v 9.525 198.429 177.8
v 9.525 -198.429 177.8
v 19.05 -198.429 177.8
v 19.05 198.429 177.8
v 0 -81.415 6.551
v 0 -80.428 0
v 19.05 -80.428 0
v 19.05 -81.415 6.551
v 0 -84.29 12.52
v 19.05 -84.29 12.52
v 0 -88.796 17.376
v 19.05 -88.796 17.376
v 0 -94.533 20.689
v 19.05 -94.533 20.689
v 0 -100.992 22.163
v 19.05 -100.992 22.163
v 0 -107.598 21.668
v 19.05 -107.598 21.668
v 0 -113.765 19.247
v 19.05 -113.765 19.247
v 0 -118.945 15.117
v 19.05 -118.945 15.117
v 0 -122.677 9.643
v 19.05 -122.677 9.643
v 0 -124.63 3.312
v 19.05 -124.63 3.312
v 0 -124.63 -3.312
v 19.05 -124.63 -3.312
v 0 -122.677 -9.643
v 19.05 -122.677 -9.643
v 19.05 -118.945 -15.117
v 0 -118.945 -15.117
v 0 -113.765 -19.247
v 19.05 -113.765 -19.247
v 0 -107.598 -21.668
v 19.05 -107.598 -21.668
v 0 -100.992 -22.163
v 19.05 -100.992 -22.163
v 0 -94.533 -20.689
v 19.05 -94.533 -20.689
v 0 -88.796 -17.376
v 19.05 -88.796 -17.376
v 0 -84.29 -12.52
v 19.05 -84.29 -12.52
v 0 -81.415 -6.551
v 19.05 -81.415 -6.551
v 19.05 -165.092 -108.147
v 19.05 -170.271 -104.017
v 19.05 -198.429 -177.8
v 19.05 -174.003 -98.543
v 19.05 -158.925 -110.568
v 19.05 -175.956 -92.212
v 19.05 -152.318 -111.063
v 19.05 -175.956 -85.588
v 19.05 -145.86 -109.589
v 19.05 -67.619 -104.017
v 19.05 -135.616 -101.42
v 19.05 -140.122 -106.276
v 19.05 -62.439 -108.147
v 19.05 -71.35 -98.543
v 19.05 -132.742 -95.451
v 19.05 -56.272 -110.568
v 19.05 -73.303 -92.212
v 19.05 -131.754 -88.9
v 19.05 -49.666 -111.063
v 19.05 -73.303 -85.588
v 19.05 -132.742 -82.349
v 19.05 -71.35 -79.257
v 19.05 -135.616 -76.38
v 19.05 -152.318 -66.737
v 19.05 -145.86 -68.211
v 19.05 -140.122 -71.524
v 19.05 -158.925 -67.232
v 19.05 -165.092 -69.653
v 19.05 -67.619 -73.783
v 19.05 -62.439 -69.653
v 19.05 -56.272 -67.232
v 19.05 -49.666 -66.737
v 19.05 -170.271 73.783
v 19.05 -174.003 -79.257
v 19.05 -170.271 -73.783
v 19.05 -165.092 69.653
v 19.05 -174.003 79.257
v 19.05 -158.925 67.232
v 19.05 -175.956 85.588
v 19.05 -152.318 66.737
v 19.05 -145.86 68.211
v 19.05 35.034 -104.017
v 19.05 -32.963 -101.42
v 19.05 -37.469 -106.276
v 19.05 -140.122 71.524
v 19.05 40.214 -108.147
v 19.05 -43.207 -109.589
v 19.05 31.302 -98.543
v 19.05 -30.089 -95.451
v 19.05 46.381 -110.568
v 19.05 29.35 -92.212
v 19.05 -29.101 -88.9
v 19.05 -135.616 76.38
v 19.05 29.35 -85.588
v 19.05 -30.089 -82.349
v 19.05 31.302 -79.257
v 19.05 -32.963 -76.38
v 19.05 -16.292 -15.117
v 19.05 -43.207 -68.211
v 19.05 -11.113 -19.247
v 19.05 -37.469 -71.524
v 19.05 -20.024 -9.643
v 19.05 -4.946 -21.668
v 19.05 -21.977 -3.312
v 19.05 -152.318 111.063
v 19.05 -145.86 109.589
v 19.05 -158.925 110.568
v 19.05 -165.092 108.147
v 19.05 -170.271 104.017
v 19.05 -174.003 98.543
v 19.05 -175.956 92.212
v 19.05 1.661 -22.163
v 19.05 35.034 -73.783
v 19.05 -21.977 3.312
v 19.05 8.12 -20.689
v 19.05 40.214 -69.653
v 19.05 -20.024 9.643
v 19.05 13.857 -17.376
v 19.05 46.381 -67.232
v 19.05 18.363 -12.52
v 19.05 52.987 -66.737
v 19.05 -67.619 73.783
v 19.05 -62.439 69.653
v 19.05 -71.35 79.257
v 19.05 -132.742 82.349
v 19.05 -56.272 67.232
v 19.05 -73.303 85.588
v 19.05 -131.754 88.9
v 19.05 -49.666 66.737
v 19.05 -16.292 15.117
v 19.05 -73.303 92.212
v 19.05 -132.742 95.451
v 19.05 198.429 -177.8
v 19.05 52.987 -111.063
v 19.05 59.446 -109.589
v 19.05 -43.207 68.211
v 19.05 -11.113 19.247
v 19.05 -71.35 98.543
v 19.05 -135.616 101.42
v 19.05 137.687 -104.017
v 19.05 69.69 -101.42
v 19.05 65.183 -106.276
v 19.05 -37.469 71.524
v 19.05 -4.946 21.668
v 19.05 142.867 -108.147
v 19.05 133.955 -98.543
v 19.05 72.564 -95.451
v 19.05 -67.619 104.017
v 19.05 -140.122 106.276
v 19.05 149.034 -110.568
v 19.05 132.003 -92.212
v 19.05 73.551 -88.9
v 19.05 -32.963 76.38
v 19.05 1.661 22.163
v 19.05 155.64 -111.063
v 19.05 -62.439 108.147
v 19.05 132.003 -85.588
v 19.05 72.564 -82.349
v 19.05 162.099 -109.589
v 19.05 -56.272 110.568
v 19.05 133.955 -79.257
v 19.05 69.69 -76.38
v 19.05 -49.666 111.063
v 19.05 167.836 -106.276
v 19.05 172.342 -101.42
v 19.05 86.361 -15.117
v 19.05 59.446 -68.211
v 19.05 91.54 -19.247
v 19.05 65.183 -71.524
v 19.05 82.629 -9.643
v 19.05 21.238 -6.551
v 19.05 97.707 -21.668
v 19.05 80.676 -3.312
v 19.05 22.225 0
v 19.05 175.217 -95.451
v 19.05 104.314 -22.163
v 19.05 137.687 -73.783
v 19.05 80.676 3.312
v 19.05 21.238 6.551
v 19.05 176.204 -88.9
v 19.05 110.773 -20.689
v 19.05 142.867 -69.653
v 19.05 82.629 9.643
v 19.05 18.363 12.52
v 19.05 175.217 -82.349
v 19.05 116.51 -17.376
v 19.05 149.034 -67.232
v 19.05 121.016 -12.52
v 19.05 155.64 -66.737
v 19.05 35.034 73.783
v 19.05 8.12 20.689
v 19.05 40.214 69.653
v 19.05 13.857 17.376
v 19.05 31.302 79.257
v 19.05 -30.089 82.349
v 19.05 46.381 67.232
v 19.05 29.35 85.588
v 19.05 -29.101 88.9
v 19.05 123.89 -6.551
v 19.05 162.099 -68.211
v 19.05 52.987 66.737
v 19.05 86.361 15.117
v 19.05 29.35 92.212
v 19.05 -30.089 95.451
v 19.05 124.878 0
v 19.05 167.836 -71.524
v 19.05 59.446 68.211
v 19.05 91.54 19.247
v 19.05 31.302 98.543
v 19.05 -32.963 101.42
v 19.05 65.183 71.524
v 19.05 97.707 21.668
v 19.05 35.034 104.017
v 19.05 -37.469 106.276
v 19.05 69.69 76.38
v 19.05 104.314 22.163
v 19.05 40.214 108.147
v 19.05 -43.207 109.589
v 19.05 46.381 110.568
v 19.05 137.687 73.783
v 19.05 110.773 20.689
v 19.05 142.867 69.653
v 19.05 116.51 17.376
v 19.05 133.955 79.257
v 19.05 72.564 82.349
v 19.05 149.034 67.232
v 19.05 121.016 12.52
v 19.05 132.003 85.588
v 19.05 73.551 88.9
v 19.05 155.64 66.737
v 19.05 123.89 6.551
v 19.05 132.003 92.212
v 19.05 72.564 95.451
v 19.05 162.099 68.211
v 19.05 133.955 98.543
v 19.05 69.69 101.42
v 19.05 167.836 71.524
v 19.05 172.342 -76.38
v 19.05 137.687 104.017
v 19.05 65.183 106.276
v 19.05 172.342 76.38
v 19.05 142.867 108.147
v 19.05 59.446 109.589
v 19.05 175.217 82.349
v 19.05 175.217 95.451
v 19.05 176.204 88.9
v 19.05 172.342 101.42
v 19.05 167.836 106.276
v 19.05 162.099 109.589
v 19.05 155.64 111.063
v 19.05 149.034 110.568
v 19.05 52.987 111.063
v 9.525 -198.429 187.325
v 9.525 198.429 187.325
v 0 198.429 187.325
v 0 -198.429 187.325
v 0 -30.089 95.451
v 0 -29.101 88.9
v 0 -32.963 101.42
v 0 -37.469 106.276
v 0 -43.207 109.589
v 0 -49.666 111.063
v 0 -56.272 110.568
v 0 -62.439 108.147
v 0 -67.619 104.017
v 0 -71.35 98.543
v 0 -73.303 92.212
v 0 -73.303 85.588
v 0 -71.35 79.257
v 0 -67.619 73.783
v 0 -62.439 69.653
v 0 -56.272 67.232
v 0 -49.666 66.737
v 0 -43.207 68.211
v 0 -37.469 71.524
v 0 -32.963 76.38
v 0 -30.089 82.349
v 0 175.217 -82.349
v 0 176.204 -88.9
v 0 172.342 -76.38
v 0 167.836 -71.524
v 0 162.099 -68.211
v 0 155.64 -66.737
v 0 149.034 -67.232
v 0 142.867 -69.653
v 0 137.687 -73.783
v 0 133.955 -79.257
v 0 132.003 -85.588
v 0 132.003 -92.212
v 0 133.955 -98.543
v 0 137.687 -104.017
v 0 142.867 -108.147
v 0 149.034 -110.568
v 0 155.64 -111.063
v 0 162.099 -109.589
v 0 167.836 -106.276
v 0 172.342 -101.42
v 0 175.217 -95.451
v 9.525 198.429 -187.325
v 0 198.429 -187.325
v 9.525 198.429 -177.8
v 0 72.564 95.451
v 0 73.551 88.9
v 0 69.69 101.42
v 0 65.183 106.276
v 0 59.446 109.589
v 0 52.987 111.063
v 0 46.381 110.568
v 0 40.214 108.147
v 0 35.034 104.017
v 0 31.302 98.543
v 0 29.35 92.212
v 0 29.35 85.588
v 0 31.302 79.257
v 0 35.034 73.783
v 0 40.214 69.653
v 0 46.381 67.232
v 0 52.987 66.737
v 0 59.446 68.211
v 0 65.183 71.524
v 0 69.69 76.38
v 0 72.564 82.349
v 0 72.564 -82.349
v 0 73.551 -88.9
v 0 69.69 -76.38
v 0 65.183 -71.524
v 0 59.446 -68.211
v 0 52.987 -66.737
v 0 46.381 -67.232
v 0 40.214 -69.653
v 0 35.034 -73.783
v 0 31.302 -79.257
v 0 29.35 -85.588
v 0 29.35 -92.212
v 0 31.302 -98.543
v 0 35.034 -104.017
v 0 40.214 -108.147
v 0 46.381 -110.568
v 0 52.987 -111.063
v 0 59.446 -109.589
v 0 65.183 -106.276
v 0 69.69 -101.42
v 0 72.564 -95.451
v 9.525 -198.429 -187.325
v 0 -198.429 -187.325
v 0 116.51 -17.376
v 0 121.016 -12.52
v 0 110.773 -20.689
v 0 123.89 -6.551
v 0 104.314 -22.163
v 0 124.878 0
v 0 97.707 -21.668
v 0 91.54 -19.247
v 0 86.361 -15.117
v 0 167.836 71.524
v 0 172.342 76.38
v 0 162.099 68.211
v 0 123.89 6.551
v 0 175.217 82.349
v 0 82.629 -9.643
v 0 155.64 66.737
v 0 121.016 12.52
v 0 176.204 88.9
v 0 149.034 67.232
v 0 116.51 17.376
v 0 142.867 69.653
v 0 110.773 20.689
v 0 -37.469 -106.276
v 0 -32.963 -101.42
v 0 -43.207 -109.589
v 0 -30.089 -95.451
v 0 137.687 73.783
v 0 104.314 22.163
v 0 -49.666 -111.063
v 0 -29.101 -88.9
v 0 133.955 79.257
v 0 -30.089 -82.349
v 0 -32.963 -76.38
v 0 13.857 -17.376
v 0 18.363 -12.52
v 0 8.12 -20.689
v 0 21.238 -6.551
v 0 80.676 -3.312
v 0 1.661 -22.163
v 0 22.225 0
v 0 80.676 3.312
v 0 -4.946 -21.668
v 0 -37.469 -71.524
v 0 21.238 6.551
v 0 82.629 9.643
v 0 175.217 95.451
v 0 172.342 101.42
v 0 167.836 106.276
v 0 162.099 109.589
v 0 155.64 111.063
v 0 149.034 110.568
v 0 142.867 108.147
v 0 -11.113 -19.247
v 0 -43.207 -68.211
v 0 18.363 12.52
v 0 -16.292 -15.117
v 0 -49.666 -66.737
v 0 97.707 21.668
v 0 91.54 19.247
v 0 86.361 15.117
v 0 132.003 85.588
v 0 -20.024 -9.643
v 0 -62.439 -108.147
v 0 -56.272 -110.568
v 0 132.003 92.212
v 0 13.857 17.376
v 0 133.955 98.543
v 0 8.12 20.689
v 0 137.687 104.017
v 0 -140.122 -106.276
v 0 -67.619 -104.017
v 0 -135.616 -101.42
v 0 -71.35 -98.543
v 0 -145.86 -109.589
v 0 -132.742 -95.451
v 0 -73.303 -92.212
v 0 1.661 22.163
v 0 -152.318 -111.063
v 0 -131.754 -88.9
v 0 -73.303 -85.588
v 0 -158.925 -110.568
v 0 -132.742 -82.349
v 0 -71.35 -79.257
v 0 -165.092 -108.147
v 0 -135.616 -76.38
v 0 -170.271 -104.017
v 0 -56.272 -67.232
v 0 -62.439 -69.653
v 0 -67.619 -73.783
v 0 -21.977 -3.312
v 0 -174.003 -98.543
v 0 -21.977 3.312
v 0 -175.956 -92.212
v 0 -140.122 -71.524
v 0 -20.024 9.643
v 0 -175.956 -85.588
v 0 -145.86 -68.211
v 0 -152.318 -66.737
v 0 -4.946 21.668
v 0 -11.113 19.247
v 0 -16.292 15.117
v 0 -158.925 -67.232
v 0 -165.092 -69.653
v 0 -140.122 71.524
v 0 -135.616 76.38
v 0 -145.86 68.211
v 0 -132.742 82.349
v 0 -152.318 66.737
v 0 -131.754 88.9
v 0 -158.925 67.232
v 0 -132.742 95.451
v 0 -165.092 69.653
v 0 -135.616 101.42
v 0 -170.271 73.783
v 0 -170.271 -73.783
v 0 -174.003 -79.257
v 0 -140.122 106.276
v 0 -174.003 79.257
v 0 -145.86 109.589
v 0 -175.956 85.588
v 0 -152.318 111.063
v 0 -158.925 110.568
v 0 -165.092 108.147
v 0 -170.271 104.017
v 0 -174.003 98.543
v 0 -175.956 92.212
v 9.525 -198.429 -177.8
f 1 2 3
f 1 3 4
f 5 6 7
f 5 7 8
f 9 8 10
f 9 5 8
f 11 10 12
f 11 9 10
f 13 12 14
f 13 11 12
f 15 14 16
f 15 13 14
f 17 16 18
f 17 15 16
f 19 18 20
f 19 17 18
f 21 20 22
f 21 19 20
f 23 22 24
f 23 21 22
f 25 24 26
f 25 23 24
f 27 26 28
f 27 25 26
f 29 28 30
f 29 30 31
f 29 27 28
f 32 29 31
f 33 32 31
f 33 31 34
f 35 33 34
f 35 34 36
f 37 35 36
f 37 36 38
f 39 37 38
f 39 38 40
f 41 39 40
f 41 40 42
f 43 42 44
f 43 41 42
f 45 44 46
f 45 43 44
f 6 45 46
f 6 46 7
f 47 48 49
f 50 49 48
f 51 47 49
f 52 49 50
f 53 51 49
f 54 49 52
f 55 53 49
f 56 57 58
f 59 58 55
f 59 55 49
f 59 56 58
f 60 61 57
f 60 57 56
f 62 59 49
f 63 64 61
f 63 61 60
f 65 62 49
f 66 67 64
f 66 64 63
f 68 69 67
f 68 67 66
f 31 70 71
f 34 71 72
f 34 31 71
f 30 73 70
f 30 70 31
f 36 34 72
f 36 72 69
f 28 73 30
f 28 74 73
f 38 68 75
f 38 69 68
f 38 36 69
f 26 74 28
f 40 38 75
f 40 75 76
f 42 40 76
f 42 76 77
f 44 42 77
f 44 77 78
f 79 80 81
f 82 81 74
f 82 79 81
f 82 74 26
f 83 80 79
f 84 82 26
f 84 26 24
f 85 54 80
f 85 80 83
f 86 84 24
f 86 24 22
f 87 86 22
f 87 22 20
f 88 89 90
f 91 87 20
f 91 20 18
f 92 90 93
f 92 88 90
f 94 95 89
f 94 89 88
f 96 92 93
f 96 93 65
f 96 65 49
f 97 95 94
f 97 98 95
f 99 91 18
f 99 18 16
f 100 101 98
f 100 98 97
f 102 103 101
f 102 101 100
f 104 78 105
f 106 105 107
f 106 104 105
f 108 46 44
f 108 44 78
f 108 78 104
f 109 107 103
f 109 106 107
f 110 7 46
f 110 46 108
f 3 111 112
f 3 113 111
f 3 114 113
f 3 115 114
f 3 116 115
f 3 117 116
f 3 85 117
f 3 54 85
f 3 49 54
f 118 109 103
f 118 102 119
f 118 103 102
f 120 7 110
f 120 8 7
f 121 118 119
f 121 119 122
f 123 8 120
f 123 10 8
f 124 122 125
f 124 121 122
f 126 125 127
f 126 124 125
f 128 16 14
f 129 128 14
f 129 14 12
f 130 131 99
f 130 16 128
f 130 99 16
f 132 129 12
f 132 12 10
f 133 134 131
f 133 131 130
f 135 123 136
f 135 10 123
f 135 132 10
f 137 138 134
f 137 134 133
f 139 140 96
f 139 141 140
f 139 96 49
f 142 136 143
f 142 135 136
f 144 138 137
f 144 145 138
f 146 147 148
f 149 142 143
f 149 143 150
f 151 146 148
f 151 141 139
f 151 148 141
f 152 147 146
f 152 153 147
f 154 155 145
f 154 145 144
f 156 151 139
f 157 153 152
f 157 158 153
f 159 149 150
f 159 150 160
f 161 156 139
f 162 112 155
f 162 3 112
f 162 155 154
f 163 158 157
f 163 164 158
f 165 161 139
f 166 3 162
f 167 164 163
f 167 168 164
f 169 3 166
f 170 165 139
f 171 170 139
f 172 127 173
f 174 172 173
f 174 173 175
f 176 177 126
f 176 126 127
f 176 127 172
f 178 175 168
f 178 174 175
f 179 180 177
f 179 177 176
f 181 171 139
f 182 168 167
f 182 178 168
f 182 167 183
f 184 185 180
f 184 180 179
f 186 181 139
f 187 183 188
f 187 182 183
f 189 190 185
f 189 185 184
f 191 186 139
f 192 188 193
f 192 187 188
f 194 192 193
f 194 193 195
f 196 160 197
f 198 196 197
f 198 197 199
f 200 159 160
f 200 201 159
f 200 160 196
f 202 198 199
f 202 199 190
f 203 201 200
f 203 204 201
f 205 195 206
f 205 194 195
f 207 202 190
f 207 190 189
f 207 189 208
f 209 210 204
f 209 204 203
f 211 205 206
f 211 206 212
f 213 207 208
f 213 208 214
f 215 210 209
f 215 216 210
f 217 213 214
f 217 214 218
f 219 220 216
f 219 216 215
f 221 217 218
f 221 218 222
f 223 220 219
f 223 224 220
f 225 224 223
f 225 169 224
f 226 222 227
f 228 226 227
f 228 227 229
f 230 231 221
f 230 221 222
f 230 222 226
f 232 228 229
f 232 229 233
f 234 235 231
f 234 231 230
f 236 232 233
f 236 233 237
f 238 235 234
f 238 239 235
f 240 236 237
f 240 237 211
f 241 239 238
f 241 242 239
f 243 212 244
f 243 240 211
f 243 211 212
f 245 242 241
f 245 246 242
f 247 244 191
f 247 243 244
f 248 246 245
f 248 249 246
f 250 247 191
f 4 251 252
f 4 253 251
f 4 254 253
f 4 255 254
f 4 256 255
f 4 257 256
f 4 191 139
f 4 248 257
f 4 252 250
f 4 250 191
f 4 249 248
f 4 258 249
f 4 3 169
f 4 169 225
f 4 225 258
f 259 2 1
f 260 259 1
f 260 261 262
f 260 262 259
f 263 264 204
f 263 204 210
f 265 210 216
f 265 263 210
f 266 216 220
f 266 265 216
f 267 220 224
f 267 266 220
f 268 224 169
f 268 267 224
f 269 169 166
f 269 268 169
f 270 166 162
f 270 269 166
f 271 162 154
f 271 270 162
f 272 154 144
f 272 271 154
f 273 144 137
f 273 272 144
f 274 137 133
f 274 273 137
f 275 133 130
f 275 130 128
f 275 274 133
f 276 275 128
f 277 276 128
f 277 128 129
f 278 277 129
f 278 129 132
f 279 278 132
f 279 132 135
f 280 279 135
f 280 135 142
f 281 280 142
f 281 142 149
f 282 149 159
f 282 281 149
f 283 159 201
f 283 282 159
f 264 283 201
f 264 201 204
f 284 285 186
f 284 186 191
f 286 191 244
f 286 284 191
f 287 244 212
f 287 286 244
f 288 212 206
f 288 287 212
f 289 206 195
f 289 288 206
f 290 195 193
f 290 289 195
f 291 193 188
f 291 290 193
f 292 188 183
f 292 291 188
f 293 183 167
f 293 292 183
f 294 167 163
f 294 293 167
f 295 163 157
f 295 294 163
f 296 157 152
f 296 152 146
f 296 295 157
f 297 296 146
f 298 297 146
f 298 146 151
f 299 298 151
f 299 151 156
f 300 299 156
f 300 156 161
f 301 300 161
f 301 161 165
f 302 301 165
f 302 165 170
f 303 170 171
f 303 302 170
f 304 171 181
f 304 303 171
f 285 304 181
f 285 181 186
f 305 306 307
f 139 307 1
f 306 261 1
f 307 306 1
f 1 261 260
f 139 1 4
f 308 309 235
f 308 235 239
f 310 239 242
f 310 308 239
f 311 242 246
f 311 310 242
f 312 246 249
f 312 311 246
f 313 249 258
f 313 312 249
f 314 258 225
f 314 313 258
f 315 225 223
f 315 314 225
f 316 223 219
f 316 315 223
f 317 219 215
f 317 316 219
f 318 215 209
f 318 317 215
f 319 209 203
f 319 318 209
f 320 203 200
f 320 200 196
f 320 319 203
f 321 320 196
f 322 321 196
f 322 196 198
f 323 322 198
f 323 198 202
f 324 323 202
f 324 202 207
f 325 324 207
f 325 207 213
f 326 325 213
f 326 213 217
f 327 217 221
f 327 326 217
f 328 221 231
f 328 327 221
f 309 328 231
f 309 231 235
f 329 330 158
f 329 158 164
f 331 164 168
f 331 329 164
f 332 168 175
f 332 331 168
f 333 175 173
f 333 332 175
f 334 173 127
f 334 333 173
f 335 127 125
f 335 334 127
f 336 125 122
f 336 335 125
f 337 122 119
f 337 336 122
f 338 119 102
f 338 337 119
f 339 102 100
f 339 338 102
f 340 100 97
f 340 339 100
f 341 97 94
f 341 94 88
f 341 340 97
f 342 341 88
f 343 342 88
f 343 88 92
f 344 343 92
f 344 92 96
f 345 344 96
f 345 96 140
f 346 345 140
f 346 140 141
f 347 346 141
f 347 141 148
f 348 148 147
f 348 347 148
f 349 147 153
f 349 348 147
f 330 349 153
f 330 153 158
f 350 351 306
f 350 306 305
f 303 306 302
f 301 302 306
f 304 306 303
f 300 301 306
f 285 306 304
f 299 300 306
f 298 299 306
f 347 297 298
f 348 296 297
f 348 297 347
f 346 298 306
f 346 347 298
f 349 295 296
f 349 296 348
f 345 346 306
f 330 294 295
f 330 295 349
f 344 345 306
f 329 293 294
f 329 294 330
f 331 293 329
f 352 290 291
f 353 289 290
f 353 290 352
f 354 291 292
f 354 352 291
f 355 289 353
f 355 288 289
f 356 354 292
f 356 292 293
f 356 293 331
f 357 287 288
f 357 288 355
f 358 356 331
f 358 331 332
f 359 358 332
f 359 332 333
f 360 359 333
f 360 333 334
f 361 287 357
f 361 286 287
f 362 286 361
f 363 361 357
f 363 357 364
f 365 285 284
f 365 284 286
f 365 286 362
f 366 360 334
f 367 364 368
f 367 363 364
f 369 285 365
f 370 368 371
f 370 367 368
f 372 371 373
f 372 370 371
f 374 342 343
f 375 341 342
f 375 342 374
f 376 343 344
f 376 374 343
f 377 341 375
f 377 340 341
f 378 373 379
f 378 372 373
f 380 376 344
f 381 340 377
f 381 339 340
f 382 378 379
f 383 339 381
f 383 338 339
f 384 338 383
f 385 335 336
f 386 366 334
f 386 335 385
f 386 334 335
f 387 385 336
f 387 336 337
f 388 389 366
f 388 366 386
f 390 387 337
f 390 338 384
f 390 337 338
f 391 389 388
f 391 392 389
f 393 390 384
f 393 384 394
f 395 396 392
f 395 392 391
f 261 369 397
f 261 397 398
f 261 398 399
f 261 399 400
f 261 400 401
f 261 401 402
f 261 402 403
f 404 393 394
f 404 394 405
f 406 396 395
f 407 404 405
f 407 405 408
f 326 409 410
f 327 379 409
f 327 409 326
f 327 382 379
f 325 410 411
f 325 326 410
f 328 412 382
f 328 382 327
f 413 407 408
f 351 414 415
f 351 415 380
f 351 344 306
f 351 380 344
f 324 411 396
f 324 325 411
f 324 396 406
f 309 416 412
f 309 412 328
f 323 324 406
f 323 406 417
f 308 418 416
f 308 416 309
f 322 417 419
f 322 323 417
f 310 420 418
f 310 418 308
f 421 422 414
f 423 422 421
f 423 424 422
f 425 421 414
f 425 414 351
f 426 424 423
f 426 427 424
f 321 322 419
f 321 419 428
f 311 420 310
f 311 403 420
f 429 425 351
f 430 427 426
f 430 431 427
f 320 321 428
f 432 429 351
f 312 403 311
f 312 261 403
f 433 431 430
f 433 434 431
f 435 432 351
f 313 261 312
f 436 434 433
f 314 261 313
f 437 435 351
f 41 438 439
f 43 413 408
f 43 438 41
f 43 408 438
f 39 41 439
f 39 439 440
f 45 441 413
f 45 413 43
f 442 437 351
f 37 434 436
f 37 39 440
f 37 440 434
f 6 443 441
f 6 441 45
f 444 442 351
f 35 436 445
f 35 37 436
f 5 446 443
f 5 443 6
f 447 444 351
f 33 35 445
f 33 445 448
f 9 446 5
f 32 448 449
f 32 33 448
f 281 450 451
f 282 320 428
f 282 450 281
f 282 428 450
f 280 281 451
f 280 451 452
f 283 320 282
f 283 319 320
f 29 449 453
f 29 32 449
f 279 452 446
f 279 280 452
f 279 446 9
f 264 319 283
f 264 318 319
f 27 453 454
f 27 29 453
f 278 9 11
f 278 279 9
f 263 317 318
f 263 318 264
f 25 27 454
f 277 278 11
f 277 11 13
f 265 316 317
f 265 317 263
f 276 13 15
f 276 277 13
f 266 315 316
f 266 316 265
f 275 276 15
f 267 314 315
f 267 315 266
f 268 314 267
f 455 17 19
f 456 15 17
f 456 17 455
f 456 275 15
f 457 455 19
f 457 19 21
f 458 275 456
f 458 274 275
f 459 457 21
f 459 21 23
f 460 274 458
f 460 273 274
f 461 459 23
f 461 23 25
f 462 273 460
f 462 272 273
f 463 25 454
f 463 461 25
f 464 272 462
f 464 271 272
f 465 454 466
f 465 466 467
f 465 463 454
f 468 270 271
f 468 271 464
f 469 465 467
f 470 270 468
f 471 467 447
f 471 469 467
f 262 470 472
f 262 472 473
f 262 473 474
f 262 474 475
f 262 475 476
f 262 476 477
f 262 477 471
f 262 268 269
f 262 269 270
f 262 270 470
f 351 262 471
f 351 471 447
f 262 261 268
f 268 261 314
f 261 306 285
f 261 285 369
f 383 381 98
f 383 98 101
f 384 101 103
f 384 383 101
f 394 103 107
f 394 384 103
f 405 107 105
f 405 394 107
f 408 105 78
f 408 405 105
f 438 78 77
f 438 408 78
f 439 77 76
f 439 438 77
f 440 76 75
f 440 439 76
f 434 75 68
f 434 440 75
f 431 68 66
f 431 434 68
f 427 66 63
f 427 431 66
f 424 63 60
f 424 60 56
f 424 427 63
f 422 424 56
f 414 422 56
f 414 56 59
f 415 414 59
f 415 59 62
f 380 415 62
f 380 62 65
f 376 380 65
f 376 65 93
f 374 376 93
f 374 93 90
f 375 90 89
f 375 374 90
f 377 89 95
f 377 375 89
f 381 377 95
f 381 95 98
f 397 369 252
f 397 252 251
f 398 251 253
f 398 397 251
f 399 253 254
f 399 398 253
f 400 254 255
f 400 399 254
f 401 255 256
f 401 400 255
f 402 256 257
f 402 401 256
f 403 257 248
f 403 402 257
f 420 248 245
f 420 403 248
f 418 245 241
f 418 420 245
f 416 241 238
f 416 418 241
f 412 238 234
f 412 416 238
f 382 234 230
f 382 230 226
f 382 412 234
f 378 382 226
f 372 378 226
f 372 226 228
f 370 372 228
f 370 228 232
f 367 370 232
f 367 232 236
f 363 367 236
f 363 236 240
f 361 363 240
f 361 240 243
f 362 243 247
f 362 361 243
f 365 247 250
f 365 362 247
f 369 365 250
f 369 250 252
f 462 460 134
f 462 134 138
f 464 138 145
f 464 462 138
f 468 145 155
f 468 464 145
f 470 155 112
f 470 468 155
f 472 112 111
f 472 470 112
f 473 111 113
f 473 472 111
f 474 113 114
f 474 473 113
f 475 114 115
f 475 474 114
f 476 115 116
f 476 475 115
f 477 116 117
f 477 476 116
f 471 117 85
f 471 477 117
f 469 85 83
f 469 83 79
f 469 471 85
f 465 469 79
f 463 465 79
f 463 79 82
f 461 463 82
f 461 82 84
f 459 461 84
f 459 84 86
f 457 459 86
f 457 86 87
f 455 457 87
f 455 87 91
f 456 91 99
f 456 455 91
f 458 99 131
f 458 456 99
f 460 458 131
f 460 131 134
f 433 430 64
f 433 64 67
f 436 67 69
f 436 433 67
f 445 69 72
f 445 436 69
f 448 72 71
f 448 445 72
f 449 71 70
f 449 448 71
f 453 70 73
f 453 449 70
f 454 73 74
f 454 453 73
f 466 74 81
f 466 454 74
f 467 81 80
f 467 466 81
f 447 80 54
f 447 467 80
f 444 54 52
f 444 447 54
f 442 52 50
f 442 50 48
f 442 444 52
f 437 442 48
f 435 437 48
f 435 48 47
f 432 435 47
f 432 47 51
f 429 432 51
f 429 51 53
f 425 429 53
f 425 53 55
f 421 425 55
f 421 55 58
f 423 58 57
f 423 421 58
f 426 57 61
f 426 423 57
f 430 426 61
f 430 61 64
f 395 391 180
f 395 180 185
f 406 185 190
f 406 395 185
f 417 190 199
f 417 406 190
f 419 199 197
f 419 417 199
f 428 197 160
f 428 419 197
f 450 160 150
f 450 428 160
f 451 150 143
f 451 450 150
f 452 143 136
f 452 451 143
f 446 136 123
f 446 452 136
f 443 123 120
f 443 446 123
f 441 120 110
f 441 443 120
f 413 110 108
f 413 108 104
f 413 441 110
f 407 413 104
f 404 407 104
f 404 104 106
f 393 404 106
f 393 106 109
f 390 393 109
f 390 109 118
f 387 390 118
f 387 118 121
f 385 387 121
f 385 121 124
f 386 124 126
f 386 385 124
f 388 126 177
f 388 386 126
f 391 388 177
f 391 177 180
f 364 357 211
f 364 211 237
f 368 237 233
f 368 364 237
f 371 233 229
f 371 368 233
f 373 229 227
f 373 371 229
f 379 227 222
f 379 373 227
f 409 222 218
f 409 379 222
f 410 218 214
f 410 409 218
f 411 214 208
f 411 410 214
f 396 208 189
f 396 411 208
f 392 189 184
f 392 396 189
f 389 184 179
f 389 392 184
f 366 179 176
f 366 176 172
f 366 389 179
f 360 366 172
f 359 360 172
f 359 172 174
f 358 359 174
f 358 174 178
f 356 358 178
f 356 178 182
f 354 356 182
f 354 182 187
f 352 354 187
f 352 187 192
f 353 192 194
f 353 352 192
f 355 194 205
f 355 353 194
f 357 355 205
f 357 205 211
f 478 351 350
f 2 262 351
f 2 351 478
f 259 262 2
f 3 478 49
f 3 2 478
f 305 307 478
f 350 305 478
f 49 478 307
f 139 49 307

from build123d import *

# Parameters (mm, degrees)
F0_W     = 396.858634
F0_H     = 355.6
F0_R     = 22.225
F1_DEPTH = 19.05
F2_W     = 9.525
F2_H     = 396.858634
F3_DEPTH = 9.525
F4_W     = 9.525
F4_H     = 396.858634
F5_DEPTH = 9.525


with BuildPart() as f1:
    # F0 (on Right) → F1 (new body)
    with BuildSketch(Plane.YZ):
        Rectangle(F0_W, F0_H)
        with Locations((-153.979317, -88.9)):
            Circle(F0_R, mode=Mode.SUBTRACT)
        with Locations((-51.326439, -88.9)):
            Circle(F0_R, mode=Mode.SUBTRACT)
        with Locations((51.326439, -88.9)):
            Circle(F0_R, mode=Mode.SUBTRACT)
        with Locations((153.979317, -88.9)):
            Circle(F0_R, mode=Mode.SUBTRACT)
        with Locations((-102.652878, 0)):
            Circle(F0_R, mode=Mode.SUBTRACT)
        with Locations((-153.979317, 88.9)):
            Circle(F0_R, mode=Mode.SUBTRACT)
        with Locations((-51.326439, 88.9)):
            Circle(F0_R, mode=Mode.SUBTRACT)
        Circle(F0_R, mode=Mode.SUBTRACT)
        with Locations((102.652878, 0)):
            Circle(F0_R, mode=Mode.SUBTRACT)
        with Locations((51.326439, 88.9)):
            Circle(F0_R, mode=Mode.SUBTRACT)
        with Locations((153.979317, 88.9)):
            Circle(F0_R, mode=Mode.SUBTRACT)
    extrude(amount=F1_DEPTH)

    # F2 (on face) → F3 (join)
    with BuildSketch(Plane.XY.offset(177.8)):
        with Locations((4.7625, 0)):
            Rectangle(F2_W, F2_H)
    extrude(amount=F3_DEPTH)

    # F4 (on face) → F5 (join)
    with BuildSketch(Plane(origin=(0, 0, -177.8), x_dir=(1, 0, 0), z_dir=(0, 0, -1))):
        with Locations((4.7625, 0)):
            Rectangle(F4_W, F4_H)
    extrude(amount=F5_DEPTH)


solid = f1.part
